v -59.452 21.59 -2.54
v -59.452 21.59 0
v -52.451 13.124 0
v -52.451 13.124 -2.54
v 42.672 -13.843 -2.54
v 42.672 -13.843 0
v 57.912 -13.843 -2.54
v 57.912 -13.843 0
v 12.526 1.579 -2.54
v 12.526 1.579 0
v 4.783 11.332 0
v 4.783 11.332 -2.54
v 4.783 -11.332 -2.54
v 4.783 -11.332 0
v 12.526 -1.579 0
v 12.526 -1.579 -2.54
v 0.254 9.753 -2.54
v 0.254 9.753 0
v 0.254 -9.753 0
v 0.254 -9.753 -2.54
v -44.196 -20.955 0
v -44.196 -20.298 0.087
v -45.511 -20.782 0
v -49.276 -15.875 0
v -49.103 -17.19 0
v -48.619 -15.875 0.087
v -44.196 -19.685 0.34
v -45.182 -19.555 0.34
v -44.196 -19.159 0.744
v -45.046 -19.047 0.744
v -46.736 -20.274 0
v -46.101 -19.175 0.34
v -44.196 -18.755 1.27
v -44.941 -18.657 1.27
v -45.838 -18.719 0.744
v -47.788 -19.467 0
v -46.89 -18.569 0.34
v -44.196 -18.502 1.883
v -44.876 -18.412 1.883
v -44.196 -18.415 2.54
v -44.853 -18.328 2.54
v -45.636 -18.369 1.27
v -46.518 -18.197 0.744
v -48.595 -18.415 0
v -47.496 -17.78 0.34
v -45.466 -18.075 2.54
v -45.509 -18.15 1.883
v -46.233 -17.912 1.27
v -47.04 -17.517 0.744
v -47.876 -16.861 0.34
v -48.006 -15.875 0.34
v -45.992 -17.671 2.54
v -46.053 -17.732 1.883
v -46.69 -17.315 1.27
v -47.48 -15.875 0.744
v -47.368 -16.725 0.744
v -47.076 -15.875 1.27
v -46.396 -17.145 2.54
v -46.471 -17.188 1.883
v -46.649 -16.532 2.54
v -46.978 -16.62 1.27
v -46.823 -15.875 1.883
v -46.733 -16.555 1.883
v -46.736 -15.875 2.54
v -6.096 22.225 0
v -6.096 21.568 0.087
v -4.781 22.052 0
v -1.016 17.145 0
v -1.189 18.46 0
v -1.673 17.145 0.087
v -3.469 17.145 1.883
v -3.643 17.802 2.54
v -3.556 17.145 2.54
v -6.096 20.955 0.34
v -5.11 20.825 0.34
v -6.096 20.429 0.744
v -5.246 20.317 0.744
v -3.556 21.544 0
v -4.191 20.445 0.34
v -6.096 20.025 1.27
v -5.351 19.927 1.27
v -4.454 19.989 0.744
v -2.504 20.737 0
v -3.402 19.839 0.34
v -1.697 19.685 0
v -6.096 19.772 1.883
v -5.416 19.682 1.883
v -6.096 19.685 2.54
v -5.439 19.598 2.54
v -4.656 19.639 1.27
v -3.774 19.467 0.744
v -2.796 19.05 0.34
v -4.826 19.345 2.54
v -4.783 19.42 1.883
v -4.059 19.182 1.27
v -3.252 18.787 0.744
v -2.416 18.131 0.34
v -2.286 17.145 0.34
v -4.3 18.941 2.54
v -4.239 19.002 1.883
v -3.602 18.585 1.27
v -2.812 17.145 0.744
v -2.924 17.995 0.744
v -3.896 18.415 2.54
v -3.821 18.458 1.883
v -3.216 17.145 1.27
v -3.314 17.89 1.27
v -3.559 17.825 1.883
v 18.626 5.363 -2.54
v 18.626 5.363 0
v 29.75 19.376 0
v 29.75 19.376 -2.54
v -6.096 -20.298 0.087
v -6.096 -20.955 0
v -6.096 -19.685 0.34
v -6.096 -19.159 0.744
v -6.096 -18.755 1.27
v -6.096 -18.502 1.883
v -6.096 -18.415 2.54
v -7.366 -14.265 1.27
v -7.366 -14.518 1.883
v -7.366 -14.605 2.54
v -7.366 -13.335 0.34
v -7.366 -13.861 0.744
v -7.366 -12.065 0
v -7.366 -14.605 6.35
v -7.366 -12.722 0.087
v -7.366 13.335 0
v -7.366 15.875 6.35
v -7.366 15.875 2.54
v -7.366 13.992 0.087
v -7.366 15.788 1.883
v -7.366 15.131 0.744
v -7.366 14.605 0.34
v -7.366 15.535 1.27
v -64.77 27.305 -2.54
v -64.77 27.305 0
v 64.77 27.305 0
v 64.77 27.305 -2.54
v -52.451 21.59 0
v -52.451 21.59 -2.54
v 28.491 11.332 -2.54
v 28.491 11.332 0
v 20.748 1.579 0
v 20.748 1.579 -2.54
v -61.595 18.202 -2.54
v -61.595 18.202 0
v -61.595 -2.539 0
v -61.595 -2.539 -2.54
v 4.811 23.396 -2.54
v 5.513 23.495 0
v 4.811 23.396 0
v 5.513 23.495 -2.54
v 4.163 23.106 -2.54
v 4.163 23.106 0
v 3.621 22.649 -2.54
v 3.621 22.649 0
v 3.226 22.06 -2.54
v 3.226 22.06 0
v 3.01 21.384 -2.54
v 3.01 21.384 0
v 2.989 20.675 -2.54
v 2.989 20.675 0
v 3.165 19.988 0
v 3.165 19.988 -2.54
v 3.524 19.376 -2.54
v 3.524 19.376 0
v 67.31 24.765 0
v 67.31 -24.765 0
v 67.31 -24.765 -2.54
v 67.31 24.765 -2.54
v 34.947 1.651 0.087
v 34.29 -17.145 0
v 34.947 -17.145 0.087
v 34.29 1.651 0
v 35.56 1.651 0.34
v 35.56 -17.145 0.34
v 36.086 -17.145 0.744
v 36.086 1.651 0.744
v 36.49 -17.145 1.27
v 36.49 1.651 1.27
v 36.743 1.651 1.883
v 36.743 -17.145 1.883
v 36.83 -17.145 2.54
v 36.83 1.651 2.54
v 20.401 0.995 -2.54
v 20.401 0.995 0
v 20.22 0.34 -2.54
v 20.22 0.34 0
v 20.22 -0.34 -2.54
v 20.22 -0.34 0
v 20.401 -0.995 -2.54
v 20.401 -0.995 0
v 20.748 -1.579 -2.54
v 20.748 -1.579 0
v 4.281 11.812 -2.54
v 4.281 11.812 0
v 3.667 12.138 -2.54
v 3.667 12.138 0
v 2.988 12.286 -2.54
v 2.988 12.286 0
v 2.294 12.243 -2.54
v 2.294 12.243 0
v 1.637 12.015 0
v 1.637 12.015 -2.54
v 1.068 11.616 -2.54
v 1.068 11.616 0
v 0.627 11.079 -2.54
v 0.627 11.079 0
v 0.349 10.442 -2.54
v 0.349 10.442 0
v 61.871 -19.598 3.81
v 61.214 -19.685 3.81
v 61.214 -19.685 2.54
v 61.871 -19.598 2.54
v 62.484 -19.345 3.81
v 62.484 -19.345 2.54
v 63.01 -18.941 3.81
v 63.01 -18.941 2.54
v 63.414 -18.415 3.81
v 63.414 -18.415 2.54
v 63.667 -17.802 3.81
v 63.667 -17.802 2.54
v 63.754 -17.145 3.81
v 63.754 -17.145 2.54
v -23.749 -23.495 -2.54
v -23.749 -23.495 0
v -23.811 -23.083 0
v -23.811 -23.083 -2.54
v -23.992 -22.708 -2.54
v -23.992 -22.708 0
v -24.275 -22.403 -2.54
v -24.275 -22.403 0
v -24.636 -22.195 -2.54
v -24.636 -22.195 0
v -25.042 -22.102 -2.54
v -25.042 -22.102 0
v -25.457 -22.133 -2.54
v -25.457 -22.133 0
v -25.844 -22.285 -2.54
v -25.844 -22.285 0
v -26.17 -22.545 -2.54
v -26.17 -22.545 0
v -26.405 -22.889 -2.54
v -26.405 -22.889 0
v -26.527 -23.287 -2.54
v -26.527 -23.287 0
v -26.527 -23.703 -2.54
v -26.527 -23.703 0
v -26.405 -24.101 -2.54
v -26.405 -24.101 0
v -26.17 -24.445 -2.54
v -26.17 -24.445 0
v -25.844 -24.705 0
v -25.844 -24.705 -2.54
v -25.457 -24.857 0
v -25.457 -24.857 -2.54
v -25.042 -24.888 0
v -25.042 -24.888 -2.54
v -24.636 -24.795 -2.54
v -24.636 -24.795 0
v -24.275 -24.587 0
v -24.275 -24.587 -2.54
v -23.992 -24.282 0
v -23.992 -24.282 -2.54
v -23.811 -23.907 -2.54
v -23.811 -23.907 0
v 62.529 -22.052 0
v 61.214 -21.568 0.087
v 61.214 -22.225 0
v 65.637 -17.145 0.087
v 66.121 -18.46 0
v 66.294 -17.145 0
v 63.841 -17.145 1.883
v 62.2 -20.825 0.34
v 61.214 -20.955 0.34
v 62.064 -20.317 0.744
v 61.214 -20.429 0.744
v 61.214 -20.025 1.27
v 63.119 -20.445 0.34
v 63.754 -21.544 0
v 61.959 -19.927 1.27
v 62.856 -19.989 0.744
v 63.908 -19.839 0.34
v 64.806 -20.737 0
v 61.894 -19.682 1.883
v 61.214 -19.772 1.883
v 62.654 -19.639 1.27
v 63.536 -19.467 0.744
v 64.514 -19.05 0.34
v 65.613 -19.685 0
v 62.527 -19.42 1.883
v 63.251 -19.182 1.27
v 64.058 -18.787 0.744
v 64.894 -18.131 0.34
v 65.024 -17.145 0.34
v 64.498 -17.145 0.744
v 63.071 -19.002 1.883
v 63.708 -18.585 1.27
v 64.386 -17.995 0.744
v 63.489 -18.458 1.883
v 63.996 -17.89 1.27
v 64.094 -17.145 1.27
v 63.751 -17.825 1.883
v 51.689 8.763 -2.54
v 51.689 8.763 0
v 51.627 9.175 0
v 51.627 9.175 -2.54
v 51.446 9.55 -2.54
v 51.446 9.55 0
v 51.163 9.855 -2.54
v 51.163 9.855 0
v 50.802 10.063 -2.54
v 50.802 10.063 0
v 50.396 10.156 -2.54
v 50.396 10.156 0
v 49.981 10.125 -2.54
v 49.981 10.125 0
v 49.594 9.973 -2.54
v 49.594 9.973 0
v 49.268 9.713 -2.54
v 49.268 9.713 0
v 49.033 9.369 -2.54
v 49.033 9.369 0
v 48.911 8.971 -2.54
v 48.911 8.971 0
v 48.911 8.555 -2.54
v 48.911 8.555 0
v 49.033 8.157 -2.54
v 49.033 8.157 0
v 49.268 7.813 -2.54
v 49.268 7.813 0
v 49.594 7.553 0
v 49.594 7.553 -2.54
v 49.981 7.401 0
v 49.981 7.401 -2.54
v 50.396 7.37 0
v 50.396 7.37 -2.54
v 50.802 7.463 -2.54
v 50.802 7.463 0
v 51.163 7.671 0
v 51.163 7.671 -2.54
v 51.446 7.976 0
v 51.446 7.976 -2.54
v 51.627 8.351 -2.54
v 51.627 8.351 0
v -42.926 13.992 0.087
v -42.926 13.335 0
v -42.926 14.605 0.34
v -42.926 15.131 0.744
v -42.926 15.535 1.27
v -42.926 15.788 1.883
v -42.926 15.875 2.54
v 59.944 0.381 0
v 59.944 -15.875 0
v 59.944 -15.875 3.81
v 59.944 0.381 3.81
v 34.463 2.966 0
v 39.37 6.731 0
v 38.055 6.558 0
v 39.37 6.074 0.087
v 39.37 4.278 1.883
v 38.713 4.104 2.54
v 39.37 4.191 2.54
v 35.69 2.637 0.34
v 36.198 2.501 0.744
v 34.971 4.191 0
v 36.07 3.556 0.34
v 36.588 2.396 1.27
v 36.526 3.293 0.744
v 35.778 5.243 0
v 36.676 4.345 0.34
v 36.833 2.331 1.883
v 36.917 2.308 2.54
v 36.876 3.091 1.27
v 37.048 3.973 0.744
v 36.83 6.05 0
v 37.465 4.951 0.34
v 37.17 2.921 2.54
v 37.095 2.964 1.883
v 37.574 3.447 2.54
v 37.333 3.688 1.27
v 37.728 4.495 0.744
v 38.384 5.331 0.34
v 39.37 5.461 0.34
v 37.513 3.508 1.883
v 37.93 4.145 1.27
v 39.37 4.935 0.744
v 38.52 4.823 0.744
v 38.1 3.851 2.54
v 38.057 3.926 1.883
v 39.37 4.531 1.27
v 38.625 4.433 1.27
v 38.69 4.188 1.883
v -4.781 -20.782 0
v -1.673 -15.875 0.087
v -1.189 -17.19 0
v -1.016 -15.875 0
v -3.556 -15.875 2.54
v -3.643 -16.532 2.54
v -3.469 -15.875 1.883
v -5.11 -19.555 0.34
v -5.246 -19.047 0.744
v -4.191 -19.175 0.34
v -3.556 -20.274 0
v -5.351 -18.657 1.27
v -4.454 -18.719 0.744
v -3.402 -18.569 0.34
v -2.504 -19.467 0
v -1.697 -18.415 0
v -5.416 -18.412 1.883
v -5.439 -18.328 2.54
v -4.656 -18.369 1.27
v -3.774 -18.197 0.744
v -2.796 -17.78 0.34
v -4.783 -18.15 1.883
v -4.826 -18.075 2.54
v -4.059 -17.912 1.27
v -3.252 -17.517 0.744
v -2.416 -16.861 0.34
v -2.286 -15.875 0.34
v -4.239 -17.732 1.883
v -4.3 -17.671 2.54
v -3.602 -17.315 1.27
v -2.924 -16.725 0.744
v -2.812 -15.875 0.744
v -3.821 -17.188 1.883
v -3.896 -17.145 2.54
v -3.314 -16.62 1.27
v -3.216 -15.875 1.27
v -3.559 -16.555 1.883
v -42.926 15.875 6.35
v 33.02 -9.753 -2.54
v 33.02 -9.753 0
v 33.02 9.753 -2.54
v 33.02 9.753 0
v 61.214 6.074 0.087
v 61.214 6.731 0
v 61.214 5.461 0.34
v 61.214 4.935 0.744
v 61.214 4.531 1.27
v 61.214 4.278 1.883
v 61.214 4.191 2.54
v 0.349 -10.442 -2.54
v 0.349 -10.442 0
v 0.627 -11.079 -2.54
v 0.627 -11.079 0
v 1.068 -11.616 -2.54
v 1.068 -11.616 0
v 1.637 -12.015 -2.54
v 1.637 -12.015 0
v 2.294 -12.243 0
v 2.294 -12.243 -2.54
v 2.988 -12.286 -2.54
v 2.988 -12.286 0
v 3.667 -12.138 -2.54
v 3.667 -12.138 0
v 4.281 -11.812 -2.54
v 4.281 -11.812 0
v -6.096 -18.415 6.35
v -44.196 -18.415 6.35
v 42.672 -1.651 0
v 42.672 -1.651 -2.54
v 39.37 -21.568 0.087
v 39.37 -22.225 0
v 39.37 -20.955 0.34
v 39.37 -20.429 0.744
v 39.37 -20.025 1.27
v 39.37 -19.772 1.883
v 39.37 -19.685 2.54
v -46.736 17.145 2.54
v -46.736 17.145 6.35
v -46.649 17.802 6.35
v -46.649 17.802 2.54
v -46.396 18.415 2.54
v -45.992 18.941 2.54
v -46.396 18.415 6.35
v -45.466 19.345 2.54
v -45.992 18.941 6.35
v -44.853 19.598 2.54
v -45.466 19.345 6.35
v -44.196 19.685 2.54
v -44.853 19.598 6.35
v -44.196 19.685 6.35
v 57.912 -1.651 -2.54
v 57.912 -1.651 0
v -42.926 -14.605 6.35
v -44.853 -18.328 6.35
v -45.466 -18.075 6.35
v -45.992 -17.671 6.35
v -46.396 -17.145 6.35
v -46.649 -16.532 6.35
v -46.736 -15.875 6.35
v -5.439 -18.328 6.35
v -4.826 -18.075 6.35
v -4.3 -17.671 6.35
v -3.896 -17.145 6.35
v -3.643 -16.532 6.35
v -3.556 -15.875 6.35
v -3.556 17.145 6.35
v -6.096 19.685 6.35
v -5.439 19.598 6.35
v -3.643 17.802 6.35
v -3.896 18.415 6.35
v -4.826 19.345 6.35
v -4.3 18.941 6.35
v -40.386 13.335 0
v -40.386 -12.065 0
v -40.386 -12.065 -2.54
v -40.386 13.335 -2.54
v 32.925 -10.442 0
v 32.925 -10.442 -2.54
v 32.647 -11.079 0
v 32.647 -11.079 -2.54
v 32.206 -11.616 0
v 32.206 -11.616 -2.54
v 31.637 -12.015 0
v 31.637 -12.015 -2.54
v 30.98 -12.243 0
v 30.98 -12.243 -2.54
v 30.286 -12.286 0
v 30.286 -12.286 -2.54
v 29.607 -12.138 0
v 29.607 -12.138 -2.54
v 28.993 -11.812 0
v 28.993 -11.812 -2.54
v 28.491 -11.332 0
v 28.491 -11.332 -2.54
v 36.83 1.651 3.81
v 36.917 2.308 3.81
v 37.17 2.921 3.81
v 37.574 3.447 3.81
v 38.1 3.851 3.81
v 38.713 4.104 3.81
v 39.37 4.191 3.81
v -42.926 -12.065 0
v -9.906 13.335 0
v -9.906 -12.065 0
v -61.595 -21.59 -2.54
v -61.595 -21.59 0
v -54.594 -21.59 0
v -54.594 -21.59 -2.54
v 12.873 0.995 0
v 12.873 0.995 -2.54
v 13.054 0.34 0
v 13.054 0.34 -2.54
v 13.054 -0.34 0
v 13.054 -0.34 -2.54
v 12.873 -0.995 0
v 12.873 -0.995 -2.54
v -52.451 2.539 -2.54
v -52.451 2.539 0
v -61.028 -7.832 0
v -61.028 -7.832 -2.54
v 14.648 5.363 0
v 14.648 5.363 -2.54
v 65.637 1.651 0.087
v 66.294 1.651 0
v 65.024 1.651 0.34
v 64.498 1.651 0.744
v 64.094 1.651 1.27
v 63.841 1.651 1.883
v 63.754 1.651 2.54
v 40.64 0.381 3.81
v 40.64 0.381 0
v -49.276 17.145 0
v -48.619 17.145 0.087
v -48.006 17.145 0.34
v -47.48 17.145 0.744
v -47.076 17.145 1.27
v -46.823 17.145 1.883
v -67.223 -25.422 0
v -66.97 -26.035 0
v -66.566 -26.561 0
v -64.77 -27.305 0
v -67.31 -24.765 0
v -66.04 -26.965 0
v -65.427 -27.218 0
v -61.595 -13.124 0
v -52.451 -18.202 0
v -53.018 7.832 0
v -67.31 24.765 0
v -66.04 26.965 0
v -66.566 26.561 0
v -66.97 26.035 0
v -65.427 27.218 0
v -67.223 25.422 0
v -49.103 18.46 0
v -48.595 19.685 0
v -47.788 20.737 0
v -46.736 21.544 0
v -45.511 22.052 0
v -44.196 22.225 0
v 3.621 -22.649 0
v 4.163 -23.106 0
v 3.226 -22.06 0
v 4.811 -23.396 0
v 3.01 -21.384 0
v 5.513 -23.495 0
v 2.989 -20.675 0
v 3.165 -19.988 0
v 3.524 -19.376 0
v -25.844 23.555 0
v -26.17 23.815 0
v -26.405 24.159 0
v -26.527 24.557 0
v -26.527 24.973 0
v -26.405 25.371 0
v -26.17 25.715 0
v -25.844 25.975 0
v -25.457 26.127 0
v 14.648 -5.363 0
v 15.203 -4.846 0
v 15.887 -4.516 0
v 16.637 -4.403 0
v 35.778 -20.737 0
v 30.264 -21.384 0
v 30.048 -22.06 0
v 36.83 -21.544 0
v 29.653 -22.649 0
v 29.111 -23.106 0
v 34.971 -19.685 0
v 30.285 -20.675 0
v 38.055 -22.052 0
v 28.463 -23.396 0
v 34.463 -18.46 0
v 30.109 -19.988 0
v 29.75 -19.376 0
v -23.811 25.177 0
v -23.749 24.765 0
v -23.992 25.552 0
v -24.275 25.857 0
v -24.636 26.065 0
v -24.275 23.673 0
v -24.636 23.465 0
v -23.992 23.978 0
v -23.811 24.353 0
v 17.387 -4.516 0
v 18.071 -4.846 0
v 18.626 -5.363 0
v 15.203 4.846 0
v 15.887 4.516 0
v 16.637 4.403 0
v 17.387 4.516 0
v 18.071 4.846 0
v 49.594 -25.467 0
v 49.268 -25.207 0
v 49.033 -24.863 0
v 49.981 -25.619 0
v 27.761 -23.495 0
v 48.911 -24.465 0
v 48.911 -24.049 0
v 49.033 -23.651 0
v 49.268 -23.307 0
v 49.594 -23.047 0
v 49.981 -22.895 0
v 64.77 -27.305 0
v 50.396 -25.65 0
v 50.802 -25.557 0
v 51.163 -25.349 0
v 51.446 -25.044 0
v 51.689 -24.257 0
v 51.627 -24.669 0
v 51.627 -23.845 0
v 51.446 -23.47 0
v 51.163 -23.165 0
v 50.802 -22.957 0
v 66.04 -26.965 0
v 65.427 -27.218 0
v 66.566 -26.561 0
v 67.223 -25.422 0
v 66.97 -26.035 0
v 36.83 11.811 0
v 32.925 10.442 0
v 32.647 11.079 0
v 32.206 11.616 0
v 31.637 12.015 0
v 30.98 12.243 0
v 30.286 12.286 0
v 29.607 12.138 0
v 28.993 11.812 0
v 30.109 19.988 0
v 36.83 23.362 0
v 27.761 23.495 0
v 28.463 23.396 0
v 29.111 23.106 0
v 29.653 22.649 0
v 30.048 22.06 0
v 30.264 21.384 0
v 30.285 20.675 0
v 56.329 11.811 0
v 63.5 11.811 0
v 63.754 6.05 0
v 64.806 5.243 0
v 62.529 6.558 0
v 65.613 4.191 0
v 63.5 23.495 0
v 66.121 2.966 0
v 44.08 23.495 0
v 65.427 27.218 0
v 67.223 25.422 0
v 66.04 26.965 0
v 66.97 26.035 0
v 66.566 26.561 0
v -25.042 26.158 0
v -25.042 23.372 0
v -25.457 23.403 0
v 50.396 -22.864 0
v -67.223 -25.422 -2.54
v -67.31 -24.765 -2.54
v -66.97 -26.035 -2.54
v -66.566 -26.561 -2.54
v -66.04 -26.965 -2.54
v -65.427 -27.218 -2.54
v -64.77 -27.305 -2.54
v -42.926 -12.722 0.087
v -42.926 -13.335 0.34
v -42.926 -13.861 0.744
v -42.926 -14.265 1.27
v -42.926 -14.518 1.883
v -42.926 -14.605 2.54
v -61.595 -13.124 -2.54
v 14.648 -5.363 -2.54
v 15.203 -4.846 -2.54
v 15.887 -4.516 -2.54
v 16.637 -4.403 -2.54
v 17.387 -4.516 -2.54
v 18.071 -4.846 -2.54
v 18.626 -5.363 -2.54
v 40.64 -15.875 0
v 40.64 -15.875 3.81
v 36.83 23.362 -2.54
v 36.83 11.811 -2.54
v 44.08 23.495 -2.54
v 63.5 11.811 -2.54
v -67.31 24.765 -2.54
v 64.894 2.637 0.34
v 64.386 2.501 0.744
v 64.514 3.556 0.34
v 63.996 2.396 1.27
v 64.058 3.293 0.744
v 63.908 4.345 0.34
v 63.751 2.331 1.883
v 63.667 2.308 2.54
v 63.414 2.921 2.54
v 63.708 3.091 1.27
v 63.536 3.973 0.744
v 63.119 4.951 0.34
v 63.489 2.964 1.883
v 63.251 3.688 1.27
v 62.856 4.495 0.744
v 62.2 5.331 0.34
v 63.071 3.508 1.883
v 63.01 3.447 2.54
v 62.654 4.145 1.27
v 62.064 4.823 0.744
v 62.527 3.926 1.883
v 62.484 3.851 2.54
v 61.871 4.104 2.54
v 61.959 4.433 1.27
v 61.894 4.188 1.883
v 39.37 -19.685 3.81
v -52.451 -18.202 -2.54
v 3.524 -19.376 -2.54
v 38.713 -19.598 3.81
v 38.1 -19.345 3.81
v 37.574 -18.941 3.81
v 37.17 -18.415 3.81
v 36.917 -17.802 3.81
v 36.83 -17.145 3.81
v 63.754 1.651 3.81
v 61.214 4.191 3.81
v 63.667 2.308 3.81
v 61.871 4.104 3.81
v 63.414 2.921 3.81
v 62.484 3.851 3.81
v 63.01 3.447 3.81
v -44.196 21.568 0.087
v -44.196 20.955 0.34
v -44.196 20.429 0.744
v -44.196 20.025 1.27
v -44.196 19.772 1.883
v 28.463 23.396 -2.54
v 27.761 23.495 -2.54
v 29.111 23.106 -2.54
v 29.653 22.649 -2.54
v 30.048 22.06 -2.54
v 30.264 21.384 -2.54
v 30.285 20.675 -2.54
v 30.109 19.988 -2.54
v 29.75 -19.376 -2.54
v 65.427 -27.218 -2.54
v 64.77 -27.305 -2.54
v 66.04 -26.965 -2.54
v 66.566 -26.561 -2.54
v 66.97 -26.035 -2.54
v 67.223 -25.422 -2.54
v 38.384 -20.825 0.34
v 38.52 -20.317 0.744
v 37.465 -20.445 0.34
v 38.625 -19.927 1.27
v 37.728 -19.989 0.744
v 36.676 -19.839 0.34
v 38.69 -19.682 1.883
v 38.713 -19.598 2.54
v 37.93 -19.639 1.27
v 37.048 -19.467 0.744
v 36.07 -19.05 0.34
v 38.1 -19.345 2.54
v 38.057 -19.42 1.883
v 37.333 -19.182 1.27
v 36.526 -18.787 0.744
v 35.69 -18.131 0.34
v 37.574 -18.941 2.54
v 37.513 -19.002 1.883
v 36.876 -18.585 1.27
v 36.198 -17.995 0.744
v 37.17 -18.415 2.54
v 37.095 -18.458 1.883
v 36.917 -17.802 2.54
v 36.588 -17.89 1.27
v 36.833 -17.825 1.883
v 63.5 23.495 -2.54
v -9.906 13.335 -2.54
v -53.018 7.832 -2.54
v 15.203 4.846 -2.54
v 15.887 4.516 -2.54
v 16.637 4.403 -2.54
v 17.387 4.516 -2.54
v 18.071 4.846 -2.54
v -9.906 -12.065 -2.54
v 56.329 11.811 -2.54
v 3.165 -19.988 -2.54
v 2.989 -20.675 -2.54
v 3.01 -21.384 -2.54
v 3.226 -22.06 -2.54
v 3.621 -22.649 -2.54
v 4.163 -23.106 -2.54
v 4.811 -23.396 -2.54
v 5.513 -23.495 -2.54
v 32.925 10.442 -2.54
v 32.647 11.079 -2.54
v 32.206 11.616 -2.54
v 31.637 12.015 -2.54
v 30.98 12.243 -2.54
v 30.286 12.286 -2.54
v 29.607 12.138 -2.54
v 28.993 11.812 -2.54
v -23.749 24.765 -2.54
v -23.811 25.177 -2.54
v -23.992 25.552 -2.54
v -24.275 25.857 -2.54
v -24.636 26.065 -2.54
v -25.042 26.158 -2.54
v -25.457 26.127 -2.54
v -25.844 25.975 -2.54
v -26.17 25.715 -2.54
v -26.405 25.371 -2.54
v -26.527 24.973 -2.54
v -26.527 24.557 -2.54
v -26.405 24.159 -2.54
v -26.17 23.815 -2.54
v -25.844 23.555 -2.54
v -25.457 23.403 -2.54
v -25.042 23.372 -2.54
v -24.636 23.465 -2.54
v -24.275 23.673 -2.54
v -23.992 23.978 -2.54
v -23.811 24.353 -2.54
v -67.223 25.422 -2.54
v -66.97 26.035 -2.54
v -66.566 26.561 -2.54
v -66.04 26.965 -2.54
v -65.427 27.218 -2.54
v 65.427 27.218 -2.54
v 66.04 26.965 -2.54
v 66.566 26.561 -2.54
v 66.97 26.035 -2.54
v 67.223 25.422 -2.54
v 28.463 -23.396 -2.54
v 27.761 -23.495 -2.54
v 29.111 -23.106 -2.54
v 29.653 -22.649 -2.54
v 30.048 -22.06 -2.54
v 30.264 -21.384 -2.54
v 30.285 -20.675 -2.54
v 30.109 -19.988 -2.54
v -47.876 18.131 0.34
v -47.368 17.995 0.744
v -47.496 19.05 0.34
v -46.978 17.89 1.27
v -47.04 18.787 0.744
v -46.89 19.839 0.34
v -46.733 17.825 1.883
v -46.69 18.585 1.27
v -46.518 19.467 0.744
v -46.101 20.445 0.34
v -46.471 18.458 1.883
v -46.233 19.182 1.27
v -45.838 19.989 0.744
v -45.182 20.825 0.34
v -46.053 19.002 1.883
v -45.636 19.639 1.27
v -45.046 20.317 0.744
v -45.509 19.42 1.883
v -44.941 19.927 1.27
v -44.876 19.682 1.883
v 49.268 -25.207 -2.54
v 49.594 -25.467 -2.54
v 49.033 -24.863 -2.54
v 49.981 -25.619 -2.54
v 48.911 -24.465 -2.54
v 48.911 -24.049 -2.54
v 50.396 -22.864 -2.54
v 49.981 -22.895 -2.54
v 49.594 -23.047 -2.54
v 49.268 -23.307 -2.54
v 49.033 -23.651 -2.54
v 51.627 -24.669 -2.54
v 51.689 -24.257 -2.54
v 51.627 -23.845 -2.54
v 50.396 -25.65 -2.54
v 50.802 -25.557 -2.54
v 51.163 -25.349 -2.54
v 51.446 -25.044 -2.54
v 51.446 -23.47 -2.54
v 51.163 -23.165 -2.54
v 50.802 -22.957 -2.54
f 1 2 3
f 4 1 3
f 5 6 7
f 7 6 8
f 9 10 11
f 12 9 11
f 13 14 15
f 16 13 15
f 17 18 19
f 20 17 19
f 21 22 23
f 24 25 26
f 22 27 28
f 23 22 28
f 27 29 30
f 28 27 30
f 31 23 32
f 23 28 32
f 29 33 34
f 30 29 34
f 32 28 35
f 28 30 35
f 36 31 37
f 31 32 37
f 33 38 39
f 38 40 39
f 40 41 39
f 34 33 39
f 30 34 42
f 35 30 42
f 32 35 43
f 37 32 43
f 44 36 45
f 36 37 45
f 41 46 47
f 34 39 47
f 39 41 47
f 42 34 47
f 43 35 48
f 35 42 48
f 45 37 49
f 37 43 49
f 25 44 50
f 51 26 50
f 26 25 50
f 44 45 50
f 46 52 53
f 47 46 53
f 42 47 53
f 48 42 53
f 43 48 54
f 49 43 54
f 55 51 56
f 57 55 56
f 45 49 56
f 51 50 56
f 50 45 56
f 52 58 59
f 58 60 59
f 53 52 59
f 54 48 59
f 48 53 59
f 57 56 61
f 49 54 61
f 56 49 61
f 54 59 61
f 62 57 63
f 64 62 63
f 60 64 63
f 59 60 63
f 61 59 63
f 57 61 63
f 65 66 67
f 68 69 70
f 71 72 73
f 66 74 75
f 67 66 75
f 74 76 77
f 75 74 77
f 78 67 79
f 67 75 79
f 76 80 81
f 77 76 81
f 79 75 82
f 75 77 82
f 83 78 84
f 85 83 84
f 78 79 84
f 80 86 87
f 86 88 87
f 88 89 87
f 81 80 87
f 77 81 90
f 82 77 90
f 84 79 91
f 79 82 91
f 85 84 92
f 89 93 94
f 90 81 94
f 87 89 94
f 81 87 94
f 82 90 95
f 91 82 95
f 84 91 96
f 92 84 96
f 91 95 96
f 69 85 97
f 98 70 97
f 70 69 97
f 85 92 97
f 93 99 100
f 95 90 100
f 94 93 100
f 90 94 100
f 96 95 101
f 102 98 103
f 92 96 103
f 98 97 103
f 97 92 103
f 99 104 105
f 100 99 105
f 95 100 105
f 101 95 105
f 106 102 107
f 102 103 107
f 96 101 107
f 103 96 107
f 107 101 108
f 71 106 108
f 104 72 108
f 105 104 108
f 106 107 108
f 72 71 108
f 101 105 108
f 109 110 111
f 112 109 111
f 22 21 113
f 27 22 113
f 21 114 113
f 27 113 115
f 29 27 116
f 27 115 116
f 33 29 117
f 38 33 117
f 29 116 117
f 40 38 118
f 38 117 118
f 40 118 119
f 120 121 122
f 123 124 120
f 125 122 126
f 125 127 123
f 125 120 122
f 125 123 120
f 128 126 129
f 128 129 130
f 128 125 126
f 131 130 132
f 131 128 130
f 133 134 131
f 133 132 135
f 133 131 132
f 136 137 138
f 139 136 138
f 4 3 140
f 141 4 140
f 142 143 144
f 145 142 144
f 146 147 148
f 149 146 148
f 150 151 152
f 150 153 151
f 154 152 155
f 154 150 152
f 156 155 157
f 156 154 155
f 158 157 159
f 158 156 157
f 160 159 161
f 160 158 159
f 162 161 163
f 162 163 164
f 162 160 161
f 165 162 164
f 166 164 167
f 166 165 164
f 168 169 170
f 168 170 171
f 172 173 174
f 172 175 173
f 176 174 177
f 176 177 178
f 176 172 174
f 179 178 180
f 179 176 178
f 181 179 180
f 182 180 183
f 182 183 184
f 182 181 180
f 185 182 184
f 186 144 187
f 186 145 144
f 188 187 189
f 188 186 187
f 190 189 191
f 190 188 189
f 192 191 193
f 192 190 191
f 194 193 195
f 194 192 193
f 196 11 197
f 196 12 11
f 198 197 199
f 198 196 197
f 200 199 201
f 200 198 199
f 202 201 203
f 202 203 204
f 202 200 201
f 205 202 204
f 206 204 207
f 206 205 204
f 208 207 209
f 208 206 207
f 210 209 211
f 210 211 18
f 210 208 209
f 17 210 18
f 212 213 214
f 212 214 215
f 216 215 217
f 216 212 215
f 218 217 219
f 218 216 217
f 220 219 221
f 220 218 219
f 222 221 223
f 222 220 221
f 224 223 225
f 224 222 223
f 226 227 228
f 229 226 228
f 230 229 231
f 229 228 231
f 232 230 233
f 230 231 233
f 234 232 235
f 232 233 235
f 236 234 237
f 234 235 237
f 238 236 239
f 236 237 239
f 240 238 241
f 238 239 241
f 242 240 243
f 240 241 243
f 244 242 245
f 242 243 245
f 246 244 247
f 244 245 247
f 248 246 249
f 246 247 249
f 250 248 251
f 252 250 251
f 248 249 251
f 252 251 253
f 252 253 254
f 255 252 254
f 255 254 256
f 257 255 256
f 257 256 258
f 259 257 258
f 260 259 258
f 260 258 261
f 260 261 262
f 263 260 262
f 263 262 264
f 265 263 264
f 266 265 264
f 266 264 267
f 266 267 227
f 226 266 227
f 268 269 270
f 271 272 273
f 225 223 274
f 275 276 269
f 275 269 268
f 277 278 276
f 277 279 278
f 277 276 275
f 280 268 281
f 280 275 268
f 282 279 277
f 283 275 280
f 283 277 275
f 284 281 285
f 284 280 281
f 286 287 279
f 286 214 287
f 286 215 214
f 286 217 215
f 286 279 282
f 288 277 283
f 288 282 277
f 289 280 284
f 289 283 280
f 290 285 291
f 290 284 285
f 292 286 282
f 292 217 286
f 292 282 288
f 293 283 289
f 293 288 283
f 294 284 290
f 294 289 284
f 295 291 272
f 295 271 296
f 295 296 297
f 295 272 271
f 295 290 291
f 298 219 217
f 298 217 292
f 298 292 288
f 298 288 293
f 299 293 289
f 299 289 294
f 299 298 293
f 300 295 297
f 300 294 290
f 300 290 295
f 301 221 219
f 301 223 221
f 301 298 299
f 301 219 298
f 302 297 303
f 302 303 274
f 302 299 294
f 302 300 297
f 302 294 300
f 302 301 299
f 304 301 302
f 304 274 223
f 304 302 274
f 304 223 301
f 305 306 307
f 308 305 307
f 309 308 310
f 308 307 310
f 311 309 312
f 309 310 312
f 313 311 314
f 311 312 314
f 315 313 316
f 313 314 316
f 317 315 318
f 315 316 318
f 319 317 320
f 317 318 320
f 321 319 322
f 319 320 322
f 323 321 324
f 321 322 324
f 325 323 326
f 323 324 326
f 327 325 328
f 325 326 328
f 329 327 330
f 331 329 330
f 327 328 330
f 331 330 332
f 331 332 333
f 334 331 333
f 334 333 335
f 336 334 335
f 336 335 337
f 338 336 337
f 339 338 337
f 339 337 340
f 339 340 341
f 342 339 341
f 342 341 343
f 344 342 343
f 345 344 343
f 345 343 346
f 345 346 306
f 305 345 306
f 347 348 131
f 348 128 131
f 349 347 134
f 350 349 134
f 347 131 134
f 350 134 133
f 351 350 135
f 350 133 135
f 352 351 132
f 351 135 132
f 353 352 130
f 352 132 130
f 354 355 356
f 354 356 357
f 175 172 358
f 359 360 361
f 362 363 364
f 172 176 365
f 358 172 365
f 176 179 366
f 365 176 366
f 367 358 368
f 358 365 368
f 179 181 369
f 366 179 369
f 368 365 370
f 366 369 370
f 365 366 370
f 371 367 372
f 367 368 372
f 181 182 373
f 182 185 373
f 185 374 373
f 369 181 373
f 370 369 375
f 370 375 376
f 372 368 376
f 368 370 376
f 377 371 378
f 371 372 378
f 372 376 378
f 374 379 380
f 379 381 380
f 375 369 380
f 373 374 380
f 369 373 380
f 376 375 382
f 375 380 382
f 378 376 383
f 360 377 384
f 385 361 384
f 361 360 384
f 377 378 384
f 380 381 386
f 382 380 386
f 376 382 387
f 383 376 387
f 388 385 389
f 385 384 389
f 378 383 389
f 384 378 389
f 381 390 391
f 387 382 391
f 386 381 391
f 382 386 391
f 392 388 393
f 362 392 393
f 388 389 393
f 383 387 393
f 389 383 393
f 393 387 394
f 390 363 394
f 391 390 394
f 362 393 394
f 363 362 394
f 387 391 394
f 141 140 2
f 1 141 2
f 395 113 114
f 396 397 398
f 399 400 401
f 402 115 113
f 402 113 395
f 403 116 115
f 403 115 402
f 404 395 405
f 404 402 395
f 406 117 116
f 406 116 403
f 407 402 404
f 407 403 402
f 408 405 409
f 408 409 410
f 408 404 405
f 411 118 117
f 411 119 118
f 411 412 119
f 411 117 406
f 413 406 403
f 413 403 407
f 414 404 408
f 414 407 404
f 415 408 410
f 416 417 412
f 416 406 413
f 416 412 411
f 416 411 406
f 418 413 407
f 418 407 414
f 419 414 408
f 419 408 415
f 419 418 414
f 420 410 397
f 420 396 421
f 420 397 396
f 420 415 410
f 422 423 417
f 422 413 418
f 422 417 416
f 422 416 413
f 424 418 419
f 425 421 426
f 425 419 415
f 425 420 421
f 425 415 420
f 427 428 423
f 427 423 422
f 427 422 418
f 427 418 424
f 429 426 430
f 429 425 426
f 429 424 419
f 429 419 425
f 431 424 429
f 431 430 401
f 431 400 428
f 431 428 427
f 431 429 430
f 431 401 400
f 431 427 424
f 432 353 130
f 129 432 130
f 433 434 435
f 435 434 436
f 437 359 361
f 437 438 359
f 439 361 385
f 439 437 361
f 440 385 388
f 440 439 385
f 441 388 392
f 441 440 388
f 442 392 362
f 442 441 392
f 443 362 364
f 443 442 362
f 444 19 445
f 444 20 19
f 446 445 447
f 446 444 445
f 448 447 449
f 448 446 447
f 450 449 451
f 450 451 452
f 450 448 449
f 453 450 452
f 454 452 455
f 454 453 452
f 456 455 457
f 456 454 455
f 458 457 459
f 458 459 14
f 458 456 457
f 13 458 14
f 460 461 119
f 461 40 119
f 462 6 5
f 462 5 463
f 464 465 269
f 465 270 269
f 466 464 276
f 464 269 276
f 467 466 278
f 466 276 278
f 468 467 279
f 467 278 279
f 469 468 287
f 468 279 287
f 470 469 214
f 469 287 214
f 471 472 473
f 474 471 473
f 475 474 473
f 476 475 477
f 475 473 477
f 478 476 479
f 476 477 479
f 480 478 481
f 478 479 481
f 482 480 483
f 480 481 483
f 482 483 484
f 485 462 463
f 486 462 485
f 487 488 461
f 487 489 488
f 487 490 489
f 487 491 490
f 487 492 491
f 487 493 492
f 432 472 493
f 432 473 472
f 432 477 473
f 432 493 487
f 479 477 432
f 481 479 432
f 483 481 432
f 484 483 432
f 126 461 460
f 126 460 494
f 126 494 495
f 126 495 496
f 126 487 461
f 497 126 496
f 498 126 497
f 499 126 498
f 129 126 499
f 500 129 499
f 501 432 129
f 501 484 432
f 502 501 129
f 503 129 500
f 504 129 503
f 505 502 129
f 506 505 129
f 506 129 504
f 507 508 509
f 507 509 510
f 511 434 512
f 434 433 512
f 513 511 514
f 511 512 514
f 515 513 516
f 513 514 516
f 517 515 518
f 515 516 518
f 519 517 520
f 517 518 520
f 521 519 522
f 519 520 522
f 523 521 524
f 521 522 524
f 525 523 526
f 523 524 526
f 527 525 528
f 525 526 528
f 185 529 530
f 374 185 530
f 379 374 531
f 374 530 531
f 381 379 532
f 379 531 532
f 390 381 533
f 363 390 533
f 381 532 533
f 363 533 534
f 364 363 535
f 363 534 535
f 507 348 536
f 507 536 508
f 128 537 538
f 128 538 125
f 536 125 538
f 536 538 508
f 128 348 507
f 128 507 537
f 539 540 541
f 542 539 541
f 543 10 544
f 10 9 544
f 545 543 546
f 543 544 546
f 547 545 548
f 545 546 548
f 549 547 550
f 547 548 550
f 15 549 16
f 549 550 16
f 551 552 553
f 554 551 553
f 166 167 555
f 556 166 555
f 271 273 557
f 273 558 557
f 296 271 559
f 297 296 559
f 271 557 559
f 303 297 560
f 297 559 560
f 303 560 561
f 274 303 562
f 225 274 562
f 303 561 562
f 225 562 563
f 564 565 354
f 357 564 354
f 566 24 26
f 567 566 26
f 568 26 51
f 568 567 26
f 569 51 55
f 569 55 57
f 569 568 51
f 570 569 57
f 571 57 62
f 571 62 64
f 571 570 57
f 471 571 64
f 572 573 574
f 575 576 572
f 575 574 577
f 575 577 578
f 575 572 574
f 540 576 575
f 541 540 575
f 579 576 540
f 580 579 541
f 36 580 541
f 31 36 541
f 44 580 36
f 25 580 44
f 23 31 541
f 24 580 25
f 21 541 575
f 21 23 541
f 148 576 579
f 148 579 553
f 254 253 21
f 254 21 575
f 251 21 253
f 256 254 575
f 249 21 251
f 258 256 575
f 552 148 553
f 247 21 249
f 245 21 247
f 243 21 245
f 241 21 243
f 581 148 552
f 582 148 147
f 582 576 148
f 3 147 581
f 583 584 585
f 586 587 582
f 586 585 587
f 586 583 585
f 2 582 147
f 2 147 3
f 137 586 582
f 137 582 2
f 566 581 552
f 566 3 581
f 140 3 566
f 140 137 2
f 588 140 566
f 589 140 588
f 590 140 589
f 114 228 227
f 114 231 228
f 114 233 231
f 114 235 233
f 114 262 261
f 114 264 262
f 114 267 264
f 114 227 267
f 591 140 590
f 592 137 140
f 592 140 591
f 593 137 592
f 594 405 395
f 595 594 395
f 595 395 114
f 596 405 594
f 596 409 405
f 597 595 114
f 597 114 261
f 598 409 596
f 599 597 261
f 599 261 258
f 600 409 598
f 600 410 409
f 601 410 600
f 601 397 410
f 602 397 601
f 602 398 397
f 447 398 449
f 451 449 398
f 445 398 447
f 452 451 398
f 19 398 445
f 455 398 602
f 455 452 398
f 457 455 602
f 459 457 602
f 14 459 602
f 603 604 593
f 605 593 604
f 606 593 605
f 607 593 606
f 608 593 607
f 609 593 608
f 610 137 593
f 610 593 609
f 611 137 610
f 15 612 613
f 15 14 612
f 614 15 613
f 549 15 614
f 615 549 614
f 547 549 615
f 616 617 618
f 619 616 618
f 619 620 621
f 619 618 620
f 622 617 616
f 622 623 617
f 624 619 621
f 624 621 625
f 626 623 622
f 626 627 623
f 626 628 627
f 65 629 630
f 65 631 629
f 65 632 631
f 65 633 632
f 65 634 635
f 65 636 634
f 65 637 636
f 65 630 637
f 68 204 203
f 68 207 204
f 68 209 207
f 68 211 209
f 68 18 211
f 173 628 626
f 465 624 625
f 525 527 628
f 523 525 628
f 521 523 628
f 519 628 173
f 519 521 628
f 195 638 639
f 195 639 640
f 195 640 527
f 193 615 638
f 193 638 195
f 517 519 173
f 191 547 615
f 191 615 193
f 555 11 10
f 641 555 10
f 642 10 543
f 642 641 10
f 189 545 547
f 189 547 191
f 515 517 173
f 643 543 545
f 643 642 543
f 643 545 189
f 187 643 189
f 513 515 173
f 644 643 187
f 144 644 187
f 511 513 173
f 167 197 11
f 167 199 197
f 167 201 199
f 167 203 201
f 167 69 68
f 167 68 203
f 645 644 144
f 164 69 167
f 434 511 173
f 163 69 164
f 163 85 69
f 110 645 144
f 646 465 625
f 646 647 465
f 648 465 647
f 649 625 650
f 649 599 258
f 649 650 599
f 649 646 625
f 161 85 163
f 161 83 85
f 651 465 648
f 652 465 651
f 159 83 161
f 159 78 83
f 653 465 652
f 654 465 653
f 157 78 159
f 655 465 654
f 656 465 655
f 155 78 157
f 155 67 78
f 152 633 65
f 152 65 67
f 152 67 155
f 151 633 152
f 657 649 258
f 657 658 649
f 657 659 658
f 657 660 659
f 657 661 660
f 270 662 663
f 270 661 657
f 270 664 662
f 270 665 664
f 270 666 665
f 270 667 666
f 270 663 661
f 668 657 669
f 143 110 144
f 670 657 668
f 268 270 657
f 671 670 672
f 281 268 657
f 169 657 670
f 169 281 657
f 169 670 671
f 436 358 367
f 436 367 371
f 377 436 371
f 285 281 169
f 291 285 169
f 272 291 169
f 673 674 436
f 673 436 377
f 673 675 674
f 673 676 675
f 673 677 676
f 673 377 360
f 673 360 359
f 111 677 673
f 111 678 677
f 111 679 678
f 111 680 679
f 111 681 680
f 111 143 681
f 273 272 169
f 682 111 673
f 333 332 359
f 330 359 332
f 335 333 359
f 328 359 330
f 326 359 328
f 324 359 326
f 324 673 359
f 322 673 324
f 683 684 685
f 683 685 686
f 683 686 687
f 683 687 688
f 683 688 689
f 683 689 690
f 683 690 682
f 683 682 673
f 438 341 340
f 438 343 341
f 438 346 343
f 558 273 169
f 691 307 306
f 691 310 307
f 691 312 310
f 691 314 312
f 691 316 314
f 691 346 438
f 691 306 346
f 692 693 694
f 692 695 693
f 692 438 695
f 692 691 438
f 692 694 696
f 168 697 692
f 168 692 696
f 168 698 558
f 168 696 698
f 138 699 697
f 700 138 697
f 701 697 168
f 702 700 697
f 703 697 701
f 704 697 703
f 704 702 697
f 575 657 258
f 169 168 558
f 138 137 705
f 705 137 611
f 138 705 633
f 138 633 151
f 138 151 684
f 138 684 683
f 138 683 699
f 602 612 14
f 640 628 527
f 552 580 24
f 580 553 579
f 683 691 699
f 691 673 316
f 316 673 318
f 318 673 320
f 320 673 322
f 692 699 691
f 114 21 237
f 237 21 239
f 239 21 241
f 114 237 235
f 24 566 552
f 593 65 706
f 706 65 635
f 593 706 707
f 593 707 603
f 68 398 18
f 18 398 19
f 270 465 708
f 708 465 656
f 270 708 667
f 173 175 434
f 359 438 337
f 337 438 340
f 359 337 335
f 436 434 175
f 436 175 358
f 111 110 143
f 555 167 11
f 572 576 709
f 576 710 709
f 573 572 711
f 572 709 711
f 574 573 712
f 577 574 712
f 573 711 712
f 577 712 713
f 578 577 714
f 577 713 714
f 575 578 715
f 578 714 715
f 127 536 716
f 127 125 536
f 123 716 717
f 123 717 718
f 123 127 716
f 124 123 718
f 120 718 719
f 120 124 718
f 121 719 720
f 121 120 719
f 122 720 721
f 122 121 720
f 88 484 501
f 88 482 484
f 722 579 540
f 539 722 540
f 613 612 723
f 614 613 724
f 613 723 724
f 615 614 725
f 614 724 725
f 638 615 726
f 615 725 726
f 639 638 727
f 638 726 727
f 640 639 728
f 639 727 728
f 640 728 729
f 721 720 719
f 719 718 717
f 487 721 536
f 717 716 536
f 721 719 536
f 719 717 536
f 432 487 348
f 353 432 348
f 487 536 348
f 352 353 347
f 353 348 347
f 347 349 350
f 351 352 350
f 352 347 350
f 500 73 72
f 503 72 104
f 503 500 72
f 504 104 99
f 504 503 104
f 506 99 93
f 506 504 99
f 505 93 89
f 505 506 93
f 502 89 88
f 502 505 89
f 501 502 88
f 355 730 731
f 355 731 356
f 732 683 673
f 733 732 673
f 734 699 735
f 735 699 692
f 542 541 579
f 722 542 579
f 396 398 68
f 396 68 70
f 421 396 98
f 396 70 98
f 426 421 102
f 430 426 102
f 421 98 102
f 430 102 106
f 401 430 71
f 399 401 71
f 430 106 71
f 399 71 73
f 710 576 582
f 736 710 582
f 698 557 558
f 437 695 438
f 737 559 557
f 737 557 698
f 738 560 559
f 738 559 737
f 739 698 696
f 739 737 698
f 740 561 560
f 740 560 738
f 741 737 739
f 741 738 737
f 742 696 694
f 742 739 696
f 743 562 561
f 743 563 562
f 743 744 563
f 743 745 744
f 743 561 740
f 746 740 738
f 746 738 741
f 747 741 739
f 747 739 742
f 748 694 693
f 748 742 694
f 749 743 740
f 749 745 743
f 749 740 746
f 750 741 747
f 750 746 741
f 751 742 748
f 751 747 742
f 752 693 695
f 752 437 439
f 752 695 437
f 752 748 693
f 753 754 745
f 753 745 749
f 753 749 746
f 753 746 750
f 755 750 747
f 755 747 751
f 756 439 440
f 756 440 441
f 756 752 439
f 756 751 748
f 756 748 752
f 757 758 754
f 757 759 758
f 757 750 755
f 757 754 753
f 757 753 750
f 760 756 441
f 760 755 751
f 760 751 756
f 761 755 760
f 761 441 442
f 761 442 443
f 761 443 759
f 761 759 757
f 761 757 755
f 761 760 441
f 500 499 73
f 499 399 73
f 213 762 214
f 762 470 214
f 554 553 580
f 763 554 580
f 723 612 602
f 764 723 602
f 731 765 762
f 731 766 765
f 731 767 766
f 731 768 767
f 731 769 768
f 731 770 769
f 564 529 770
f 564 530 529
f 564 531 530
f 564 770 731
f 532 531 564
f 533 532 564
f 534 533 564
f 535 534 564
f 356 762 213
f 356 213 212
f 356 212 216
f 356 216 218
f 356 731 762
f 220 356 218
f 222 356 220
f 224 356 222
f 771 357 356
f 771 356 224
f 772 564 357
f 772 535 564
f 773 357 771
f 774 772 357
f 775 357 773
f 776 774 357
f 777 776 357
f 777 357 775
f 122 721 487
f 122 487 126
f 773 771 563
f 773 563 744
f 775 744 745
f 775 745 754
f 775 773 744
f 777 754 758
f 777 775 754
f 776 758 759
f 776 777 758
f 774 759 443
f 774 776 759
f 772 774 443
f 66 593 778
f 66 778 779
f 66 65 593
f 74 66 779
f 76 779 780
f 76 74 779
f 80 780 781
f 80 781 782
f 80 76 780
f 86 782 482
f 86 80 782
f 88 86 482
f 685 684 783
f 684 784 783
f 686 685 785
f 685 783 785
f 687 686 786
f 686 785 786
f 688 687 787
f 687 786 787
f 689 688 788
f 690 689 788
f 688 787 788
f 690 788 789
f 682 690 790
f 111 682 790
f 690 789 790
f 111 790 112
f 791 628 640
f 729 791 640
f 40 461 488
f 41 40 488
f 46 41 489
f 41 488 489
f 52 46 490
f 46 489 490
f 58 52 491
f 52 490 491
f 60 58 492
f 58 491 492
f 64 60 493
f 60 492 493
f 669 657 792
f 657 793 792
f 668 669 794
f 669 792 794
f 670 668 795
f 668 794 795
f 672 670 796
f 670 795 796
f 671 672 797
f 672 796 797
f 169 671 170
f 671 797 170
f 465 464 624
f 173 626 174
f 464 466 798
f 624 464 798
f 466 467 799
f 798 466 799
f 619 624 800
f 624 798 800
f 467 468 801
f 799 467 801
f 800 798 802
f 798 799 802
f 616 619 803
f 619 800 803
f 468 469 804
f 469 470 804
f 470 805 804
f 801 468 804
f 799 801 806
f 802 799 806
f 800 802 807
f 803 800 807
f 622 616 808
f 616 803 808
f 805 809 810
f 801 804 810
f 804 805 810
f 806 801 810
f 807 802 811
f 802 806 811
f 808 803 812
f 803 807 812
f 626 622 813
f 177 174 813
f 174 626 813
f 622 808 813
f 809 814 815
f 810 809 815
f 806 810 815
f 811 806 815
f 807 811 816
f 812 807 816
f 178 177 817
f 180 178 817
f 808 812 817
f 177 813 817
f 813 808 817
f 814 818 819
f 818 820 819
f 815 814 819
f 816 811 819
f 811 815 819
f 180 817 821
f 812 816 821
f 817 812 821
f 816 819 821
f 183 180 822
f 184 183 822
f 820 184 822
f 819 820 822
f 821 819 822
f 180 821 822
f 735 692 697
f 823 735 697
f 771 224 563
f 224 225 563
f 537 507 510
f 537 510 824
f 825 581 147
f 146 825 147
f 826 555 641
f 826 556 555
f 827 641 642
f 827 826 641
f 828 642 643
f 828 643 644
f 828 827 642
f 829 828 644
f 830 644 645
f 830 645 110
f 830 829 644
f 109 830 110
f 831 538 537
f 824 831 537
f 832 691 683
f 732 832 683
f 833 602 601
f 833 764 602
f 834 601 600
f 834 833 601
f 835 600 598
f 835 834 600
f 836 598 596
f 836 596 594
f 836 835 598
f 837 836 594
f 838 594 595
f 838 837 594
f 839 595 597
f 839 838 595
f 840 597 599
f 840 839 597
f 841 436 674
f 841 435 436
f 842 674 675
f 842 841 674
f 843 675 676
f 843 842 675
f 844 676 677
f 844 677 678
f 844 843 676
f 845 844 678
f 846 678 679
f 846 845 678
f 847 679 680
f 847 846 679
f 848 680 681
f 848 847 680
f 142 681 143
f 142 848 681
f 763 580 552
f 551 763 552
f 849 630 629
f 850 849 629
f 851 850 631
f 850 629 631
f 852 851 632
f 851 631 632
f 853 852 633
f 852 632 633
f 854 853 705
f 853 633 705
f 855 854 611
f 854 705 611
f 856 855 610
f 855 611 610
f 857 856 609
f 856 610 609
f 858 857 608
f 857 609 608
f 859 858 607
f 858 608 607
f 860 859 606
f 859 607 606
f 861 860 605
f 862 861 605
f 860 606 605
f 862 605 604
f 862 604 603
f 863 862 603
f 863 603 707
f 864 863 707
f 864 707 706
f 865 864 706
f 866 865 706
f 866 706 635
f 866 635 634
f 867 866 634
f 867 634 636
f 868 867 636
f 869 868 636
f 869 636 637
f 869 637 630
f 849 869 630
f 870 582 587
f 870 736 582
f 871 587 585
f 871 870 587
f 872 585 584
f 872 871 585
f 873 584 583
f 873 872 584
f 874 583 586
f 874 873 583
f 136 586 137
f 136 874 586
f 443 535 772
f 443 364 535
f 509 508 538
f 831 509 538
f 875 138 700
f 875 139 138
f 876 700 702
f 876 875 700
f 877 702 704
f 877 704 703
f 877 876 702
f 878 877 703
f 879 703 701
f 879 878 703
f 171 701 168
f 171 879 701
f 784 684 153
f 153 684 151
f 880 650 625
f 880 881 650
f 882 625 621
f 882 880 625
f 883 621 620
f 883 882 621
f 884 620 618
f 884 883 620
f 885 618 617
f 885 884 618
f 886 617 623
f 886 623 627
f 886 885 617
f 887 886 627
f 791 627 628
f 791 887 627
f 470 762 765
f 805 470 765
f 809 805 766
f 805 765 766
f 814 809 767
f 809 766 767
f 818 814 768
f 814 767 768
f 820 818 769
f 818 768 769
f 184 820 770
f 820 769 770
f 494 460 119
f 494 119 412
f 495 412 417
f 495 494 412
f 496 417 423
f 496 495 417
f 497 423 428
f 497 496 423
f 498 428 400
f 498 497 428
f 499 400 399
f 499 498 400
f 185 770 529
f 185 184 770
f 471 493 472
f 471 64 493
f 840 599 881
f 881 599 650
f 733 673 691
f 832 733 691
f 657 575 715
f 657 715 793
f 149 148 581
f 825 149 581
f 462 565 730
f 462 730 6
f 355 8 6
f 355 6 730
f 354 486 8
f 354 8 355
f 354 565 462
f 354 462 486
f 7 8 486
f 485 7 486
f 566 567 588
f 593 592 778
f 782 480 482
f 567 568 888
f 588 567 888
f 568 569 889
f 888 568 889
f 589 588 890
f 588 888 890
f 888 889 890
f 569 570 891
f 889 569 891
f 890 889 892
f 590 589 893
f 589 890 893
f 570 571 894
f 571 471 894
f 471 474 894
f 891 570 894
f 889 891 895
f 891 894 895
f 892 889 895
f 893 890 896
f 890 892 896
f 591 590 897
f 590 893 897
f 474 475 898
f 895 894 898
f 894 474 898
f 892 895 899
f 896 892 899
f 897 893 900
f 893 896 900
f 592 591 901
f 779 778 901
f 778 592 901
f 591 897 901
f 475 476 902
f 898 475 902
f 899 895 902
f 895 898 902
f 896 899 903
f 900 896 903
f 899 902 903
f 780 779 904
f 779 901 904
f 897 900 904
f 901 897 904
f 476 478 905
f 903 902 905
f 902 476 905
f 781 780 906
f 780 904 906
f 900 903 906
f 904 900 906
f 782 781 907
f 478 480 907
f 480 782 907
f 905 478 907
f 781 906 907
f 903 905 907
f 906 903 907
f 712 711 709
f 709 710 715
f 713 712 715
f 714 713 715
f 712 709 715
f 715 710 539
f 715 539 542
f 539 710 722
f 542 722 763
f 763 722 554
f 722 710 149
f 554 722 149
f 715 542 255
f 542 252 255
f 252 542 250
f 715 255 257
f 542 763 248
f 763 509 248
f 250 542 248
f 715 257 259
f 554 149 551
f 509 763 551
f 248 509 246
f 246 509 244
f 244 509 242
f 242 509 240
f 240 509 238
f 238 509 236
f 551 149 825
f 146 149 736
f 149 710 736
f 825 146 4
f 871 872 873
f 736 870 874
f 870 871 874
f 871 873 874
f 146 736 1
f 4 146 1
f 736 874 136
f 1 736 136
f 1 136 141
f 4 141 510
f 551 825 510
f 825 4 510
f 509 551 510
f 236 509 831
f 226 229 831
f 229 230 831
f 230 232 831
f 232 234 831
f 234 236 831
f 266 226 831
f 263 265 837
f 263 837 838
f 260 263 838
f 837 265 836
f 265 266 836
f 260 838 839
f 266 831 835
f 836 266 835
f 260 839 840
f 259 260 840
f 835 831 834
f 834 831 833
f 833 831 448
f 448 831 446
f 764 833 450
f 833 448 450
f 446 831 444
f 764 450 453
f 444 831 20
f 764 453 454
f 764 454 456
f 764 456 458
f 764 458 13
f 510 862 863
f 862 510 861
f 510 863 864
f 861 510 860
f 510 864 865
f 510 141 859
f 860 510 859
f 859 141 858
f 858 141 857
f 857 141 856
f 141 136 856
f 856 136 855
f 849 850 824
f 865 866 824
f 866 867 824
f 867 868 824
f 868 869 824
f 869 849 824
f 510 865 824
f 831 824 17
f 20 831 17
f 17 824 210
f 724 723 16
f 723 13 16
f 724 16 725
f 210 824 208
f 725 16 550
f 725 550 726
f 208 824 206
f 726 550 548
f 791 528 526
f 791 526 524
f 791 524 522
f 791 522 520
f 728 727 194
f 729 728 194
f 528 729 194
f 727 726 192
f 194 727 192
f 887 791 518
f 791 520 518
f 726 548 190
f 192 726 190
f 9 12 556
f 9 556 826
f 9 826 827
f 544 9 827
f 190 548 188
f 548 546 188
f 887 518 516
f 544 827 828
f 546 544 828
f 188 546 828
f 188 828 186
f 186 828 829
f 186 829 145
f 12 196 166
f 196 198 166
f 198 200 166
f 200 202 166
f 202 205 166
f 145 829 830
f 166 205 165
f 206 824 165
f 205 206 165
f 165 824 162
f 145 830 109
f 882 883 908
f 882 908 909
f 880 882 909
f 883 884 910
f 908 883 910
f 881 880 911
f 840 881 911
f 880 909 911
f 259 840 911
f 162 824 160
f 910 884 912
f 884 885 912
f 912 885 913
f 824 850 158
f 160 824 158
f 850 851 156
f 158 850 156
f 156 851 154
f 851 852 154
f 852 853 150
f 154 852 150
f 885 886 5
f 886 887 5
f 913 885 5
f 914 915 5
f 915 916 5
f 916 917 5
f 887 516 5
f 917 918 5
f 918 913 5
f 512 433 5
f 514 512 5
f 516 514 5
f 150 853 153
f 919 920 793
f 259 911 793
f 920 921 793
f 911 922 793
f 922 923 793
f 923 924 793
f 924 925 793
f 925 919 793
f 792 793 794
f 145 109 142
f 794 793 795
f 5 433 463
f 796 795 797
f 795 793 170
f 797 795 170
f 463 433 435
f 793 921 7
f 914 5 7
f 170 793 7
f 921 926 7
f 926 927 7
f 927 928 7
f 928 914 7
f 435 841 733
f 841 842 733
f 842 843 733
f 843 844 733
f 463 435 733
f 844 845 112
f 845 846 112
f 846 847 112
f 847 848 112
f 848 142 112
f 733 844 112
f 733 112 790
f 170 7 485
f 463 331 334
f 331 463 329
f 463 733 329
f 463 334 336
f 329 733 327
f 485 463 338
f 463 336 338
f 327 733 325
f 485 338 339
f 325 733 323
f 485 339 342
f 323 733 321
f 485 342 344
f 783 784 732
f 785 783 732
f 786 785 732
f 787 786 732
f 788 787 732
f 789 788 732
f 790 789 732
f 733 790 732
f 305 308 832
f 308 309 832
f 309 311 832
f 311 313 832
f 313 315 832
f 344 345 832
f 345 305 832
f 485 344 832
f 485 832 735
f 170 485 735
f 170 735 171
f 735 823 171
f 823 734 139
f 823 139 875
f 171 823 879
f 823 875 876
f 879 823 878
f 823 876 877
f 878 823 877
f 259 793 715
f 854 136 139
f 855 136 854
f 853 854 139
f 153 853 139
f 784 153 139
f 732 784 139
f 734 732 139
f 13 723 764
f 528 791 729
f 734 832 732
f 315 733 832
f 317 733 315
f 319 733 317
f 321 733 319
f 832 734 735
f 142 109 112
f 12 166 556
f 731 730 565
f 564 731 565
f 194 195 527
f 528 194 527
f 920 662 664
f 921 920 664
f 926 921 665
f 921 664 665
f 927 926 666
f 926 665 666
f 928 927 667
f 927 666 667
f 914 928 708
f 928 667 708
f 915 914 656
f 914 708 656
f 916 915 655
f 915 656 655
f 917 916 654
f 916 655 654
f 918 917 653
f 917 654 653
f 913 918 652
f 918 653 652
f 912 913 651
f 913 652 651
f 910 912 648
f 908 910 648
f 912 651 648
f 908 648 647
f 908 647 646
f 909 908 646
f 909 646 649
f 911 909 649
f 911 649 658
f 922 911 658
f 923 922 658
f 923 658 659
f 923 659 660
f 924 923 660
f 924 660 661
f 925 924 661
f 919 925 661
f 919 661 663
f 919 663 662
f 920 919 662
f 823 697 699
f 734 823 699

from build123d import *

# Parameters (mm, degrees)
F0_W     = 134.62
F0_H     = 54.61
F1_DEPTH = 2.54
F2_R     = 1.397
F3_DEPTH = 2.541
F2_W     = 43.18
F2_H     = 38.1
F2_W_2   = 35.56
F2_H_2   = 30.48
F4_DEPTH = 6.35
F2_W_3   = 26.924
F2_H_3   = 23.876
F2_W_4   = 19.304
F2_H_4   = 16.256
F5_DEPTH = 3.81
F6_W     = 30.48
F6_H     = 25.4
F6_W_2   = 15.24
F6_H_2   = 12.192
F7_DEPTH = 2.541
F8_R     = 2.53999
F9_R     = 2.54


# Not quite as in the source:
# - a fillet or chamfer is up to 0.001 mm smaller than in the source, because OpenCascade refuses the exact size
# - a feature names something its author has since deleted; it is built from what else it names


with BuildPart() as f1:
    # F0 (on Top) → F1 (new body)
    with BuildSketch(Plane.XY):
        Rectangle(F0_W, F0_H)
    extrude(amount=-F1_DEPTH)

    # F2 (on face) → F3 (cut, through all)
    with BuildSketch(Plane.XY):
        with Locations((-25.146, 24.765)):
            Circle(F2_R)
        with Locations((-25.146, -23.495)):
            Circle(F2_R)
        with Locations((50.292, 8.763)):
            Circle(F2_R)
        with Locations((50.292, -24.257)):
            Circle(F2_R)
    extrude(amount=-F3_DEPTH, mode=Mode.SUBTRACT)

    # F2 (on face) → F4 (join)
    with BuildSketch(Plane.XY):
        with Locations((-25.146, 0.635)):
            Rectangle(F2_W, F2_H)
        with Locations((-25.146, 0.635)):
            Rectangle(F2_W_2, F2_H_2, mode=Mode.SUBTRACT)
    extrude(amount=F4_DEPTH)

    # F2 (on face) → F5 (join)
    with BuildSketch(Plane.XY):
        with Locations((50.292, -7.747)):
            Rectangle(F2_W_3, F2_H_3)
        with Locations((50.292, -7.747)):
            Rectangle(F2_W_4, F2_H_4, mode=Mode.SUBTRACT)
    extrude(amount=F5_DEPTH)

    # F6 (on face) → F7 (cut, through all)
    with BuildSketch(Plane.XY):
        Polygon((13.7795, 0), (0.254, 17.0379360465), (0.254, -17.0379360465), align=None)
        Polygon((33.02, 23.495), (0.254, 23.495), (16.637, 2.8575), align=None)
        Polygon((33.02, -17.0379360465), (33.02, 17.0379360465), (19.4945, 0), align=None)
        Polygon((16.637, -2.8575), (0.254, -23.495), (33.02, -23.495), align=None)
        Polygon((56.3291969075, 11.811), (36.83, 23.3617037719), (36.83, 11.811), align=None)
        Polygon((63.5, 23.495), (44.0803815263, 23.495), (63.5, 11.811), align=None)
        with Locations((-25.146, 0.635)):
            Rectangle(F6_W, F6_H)
        with Locations((50.292, -7.747)):
            Rectangle(F6_W_2, F6_H_2)
        Polygon((-53.0180806356, 7.8316666667), (-61.595, 18.202451519), (-61.595, -2.5391181857), align=None)
        Polygon((-52.451, 21.59), (-59.4524328779, 21.59), (-52.451, 13.1242151477), align=None)
        Polygon((-52.451, -18.202451519), (-52.451, 2.5391181857), (-61.0279193644, -7.8316666667), align=None)
        Polygon((-54.5935671221, -21.59), (-61.595, -13.1242151477), (-61.595, -21.59), align=None)
    extrude(amount=-F7_DEPTH, mode=Mode.SUBTRACT)

    # F8 (radius 2.54 in the source; OpenCascade refuses exactly that, so slightly less here)
    f8_edges = [f1.edges().sort_by_distance(p)[0] for p in [
        (-25.146, -18.415, 0),
        (-46.736, 0.635, 0),
        (50.292, -19.685, 0),
        (36.83, -7.747, 0),
        (-25.146, 19.685, 0),
        (-3.556, 0.635, 0),
        (63.754, -7.747, 0),
        (50.292, 4.191, 0),
        (63.754, 4.191, 1.905),
        (63.754, -19.685, 1.905),
        (-3.556, 19.685, 3.175),
        (-3.556, -18.415, 3.175),
        (36.83, -19.685, 1.905),
        (-46.736, -18.415, 3.175),
        (-46.736, 19.685, 3.175),
        (36.83, 4.191, 1.905),
        (-25.146, 15.875, 0),
        (-25.146, -14.605, 0),
        (-67.31, -27.305, -1.27),
        (-67.31, 27.305, -1.27),
        (67.31, 27.305, -1.27),
        (67.31, -27.305, -1.27),
    ]]
    fillet(f8_edges, radius=F8_R)

    # F9
    f9_edges = [f1.edges().sort_by_distance(p)[0] for p in [
        (33.02, 23.495, -1.27),
        (13.7795, 0, -1.27),
        (16.637, -2.8575, -1.27),
        (0.254, 17.037936, -1.27),
        (33.02, 17.037936, -1.27),
        (33.02, -17.037936, -1.27),
        (33.02, -23.495, -1.27),
        (0.254, 23.495, -1.27),
        (0.254, -23.495, -1.27),
        (0.254, -17.037936, -1.27),
        (19.4945, 0, -1.27),
        (16.637, 2.8575, -1.27),
    ]]
    fillet(f9_edges, radius=F9_R)


solid = f1.part
